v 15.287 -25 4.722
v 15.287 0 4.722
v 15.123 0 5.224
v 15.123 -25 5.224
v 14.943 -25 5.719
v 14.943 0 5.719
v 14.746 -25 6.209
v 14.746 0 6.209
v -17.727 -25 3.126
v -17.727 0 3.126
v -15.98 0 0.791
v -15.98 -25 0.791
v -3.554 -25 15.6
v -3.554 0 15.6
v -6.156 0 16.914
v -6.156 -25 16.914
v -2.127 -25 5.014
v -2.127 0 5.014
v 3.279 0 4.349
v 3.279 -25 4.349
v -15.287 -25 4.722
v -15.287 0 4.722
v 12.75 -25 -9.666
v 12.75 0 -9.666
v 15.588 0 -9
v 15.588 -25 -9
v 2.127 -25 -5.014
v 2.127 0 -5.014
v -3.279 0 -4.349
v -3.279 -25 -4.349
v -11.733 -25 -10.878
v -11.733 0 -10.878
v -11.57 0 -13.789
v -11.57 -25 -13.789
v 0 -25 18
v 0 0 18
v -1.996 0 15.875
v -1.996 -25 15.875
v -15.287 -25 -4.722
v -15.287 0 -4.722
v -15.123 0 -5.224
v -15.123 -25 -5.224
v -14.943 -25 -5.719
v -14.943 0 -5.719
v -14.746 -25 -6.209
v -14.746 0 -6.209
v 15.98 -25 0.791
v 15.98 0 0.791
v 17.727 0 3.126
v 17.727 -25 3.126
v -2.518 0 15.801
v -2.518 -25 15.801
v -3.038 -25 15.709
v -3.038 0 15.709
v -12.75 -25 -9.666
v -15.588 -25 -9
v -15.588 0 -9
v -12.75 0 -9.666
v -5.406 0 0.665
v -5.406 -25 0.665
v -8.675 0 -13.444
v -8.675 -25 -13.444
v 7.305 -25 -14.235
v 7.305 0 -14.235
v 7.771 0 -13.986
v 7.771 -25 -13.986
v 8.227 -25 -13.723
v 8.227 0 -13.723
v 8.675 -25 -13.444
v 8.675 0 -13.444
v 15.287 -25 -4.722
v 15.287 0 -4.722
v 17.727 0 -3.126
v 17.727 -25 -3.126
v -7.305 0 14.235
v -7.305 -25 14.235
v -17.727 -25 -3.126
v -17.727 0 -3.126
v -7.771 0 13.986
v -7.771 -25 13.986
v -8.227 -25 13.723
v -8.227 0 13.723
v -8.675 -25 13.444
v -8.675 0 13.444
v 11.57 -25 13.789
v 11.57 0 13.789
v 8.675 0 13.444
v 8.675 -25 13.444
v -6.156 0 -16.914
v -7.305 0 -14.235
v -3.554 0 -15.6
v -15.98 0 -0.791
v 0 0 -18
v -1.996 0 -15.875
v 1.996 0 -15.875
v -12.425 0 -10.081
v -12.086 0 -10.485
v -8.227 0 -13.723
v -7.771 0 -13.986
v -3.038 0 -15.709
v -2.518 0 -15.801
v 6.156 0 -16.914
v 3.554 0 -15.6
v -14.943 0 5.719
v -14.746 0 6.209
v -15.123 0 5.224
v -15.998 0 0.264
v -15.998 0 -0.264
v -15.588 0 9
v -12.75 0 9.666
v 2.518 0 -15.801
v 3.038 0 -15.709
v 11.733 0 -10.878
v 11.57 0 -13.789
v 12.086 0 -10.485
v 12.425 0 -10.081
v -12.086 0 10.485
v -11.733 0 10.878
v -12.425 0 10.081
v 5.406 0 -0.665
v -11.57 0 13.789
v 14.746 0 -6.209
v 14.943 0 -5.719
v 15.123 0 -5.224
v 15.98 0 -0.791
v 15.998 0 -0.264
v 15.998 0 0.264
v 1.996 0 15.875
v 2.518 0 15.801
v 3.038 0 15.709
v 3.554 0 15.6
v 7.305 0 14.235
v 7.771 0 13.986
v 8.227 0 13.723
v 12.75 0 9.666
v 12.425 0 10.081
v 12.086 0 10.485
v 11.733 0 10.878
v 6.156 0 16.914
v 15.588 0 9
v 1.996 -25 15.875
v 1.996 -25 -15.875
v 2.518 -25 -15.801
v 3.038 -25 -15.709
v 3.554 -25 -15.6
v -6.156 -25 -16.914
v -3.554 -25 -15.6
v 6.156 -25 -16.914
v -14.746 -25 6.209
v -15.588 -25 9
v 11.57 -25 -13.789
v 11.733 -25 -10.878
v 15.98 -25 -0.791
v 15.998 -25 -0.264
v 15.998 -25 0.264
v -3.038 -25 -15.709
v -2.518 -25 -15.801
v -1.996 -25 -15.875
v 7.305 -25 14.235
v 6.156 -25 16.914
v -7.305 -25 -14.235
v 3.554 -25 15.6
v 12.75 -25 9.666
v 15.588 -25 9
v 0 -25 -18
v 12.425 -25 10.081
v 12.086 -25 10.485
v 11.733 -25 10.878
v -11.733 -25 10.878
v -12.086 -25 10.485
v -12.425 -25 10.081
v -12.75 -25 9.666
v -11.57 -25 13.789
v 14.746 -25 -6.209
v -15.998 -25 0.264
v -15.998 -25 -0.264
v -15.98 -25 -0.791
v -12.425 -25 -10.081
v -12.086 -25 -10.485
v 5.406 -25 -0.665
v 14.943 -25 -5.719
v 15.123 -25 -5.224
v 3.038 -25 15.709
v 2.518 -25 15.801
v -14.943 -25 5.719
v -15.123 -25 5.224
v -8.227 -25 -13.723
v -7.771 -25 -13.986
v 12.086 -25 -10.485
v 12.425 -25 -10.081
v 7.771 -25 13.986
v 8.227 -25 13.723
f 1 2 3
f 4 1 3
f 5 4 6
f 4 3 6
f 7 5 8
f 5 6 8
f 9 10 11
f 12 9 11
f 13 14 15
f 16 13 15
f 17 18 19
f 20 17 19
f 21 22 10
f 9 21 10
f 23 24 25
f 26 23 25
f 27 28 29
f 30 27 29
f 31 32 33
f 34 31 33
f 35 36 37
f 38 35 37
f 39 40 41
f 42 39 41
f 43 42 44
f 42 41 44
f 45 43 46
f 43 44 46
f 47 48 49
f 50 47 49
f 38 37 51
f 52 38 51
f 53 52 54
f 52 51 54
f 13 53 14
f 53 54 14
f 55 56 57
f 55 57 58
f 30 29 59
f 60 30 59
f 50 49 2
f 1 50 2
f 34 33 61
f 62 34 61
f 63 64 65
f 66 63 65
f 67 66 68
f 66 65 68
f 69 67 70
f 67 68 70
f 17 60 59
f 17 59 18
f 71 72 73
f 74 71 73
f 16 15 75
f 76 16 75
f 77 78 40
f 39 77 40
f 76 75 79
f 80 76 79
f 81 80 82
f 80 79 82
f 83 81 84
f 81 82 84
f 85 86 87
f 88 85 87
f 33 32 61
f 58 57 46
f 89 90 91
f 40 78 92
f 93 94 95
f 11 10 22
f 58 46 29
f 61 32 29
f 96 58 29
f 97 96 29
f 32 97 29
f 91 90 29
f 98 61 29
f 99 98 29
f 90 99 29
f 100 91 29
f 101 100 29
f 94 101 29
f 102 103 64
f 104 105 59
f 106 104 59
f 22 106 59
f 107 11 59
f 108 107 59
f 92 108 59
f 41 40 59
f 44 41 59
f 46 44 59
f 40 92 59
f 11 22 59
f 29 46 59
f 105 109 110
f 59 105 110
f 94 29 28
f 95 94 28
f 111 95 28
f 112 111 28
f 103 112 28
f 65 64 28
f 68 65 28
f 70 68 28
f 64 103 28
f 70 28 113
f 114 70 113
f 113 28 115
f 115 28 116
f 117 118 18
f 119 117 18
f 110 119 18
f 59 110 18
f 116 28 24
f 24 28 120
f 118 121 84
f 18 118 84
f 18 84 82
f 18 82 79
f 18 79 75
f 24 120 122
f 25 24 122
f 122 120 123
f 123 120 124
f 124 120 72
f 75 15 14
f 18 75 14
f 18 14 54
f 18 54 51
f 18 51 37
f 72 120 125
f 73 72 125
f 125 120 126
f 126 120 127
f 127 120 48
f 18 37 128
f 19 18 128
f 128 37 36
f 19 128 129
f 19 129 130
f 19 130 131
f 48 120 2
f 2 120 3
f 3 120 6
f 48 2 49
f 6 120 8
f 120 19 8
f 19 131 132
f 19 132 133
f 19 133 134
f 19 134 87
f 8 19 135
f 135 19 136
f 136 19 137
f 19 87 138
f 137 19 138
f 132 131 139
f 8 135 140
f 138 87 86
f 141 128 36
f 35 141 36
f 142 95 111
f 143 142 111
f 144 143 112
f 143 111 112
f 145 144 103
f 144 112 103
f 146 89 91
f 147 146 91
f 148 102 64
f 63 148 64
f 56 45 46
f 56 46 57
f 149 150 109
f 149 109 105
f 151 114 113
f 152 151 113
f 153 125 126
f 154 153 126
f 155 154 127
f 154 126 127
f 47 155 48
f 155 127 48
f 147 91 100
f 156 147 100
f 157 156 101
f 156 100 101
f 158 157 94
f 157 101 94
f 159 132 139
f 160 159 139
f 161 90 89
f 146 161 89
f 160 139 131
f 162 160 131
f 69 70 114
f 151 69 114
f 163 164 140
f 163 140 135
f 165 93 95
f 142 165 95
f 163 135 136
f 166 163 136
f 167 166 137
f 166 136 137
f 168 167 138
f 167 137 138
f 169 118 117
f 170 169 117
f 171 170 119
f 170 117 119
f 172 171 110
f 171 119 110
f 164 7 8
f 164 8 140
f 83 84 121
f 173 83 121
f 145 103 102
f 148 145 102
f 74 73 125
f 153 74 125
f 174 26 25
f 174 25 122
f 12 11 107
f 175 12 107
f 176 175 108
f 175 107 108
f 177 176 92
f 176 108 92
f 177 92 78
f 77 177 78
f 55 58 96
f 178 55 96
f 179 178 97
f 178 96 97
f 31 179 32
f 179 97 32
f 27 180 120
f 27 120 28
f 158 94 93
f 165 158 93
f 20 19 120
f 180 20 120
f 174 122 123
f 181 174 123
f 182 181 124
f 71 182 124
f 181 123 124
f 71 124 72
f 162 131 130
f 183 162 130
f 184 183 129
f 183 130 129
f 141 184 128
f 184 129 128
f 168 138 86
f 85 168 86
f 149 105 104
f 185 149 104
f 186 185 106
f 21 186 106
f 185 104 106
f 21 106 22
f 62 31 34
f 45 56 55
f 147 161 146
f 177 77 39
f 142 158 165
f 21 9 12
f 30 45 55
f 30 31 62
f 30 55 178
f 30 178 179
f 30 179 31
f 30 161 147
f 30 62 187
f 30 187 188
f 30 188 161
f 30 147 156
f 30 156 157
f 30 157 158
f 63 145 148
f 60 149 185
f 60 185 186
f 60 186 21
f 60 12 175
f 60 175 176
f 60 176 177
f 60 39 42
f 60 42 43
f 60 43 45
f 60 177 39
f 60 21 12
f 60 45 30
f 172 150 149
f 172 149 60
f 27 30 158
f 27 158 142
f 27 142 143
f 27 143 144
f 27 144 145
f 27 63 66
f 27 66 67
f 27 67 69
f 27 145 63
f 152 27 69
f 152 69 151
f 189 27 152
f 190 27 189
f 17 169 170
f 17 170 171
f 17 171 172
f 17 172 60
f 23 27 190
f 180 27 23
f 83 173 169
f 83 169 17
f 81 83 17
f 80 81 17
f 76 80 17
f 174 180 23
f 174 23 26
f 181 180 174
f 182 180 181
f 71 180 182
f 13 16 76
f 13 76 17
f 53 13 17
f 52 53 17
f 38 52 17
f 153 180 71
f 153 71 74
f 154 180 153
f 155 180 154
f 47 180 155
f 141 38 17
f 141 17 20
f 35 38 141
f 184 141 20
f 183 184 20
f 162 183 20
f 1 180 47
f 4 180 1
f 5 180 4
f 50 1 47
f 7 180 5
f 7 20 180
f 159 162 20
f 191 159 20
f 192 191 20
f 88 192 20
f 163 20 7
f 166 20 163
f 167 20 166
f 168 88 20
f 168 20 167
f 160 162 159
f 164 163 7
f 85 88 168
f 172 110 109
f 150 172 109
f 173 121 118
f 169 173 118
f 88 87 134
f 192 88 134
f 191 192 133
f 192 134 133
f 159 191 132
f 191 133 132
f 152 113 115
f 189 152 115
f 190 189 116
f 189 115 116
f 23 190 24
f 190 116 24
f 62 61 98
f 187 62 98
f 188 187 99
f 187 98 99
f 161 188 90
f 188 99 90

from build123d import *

# Parameters (mm, degrees)
F1_DEPTH = 25


with BuildPart() as f1:
    # F0 (on Front) → F1 (new body)
    with BuildSketch(Plane.XZ):
        with BuildLine():
            ThreePointArc((1.99609, 15.875), (0, 16), (-1.99609, 15.875))
            ThreePointArc((-1.99609, 15.875), (-2.778371, 15.756924), (-3.553859, 15.600323))
            ThreePointArc((-3.553859, 15.600323), (-5.472322, 15.035082), (-7.305281, 14.234917))
            ThreePointArc((-7.305281, 14.234917), (-8, 13.856406), (-8.67516, 13.444017))
            ThreePointArc((-8.67516, 13.444017), (-10.284602, 12.256711), (-11.733347, 10.877894))
            ThreePointArc((-11.733347, 10.877894), (-12.256711, 10.284602), (-12.750108, 9.666165))
            ThreePointArc((-12.750108, 9.666165), (-13.856406, 8), (-14.746198, 6.208835))
            ThreePointArc((-14.746198, 6.208835), (-15.035082, 5.472322), (-15.287206, 4.72243))
            ThreePointArc((-15.287206, 4.72243), (-15.756924, 2.778371), (-15.98044, 0.7909))
            ThreePointArc((-15.98044, 0.7909), (-16, 0), (-15.98044, -0.7909))
            ThreePointArc((-15.98044, -0.7909), (-15.756924, -2.778371), (-15.287206, -4.72243))
            ThreePointArc((-15.287206, -4.72243), (-15.035082, -5.472322), (-14.746198, -6.208835))
            ThreePointArc((-14.746198, -6.208835), (-13.856406, -8), (-12.750108, -9.666165))
            ThreePointArc((-12.750108, -9.666165), (-12.256711, -10.284602), (-11.733347, -10.877894))
            ThreePointArc((-11.733347, -10.877894), (-10.284602, -12.256711), (-8.67516, -13.444017))
            ThreePointArc((-8.67516, -13.444017), (-8, -13.856406), (-7.305281, -14.234917))
            ThreePointArc((-7.305281, -14.234917), (-5.472322, -15.035082), (-3.553859, -15.600323))
            ThreePointArc((-3.553859, -15.600323), (-2.778371, -15.756924), (-1.99609, -15.875))
            ThreePointArc((-1.99609, -15.875), (-1, -15.968719), (0, -16))
            ThreePointArc((0, -16), (1, -15.968719), (1.99609, -15.875))
            ThreePointArc((1.99609, -15.875), (2.778371, -15.756924), (3.553859, -15.600323))
            ThreePointArc((3.553859, -15.600323), (5.472322, -15.035082), (7.305281, -14.234917))
            ThreePointArc((7.305281, -14.234917), (8, -13.856406), (8.67516, -13.444017))
            ThreePointArc((8.67516, -13.444017), (10.284602, -12.256711), (11.733347, -10.877894))
            ThreePointArc((11.733347, -10.877894), (12.256711, -10.284602), (12.750108, -9.666165))
            ThreePointArc((12.750108, -9.666165), (13.856406, -8), (14.746198, -6.208835))
            ThreePointArc((14.746198, -6.208835), (15.035082, -5.472322), (15.287206, -4.72243))
            ThreePointArc((15.287206, -4.72243), (15.756924, -2.778371), (15.98044, -0.7909))
            ThreePointArc((15.98044, -0.7909), (16, 0), (15.98044, 0.7909))
            ThreePointArc((15.98044, 0.7909), (15.756924, 2.778371), (15.287206, 4.72243))
            ThreePointArc((15.287206, 4.72243), (15.035082, 5.472322), (14.746198, 6.208835))
            ThreePointArc((14.746198, 6.208835), (13.856406, 8), (12.750108, 9.666165))
            ThreePointArc((12.750108, 9.666165), (12.256711, 10.284602), (11.733347, 10.877894))
            ThreePointArc((11.733347, 10.877894), (10.284602, 12.256711), (8.67516, 13.444017))
            ThreePointArc((8.67516, 13.444017), (8, 13.856406), (7.305281, 14.234917))
            ThreePointArc((7.305281, 14.234917), (5.472322, 15.035082), (3.553859, 15.600323))
            ThreePointArc((3.553859, 15.600323), (2.778371, 15.756924), (1.99609, 15.875))
        make_face()
        Polygon((-2.12708, 5.013831), (3.278565, 4.349021), (5.405645, -0.66481), (2.12708, -5.013831), (-3.278565, -4.349021), (-5.405645, 0.66481), align=None, mode=Mode.SUBTRACT)
        with BuildLine():
            Line((6.156363, 16.914467), (3.553859, 15.600323))
            ThreePointArc((3.553859, 15.600323), (5.472322, 15.035082), (7.305281, 14.234917))
            Line((7.305281, 14.234917), (6.156363, 16.914467))
        make_face()
        with BuildLine():
            Line((0, 18), (-1.99609, 15.875))
            ThreePointArc((-1.99609, 15.875), (0, 16), (1.99609, 15.875))
            Line((1.99609, 15.875), (0, 18))
        make_face()
        with BuildLine():
            ThreePointArc((-7.305281, 14.234917), (-5.472322, 15.035082), (-3.553859, 15.600323))
            Line((-3.553859, 15.600323), (-6.156363, 16.914467))
            Line((-6.156363, 16.914467), (-7.305281, 14.234917))
        make_face()
        with BuildLine():
            ThreePointArc((-11.733347, 10.877894), (-10.284602, 12.256711), (-8.67516, 13.444017))
            Line((-8.67516, 13.444017), (-11.570177, 13.7888))
            Line((-11.570177, 13.7888), (-11.733347, 10.877894))
        make_face()
        with BuildLine():
            ThreePointArc((-14.746198, 6.208835), (-13.856406, 8), (-12.750108, 9.666165))
            Line((-12.750108, 9.666165), (-15.588457, 9))
            Line((-15.588457, 9), (-14.746198, 6.208835))
        make_face()
        with BuildLine():
            ThreePointArc((-15.98044, 0.7909), (-15.756924, 2.778371), (-15.287206, 4.72243))
            Line((-15.287206, 4.72243), (-17.72654, 3.125667))
            Line((-17.72654, 3.125667), (-15.98044, 0.7909))
        make_face()
        with BuildLine():
            ThreePointArc((-15.287206, -4.72243), (-15.756924, -2.778371), (-15.98044, -0.7909))
            Line((-15.98044, -0.7909), (-17.72654, -3.125667))
            Line((-17.72654, -3.125667), (-15.287206, -4.72243))
        make_face()
        with BuildLine():
            ThreePointArc((-12.750108, -9.666165), (-13.856406, -8), (-14.746198, -6.208835))
            Line((-14.746198, -6.208835), (-15.588457, -9))
            Line((-15.588457, -9), (-12.750108, -9.666165))
        make_face()
        with BuildLine():
            ThreePointArc((-8.67516, -13.444017), (-10.284602, -12.256711), (-11.733347, -10.877894))
            Line((-11.733347, -10.877894), (-11.570177, -13.7888))
            Line((-11.570177, -13.7888), (-8.67516, -13.444017))
        make_face()
        with BuildLine():
            ThreePointArc((-3.553859, -15.600323), (-5.472322, -15.035082), (-7.305281, -14.234917))
            Line((-7.305281, -14.234917), (-6.156363, -16.914467))
            Line((-6.156363, -16.914467), (-3.553859, -15.600323))
        make_face()
        with BuildLine():
            ThreePointArc((0, -16), (-1, -15.968719), (-1.99609, -15.875))
            Line((-1.99609, -15.875), (0, -18))
            Line((0, -18), (1.99609, -15.875))
            ThreePointArc((1.99609, -15.875), (1, -15.968719), (0, -16))
        make_face()
        with BuildLine():
            Line((6.156363, -16.914467), (7.305281, -14.234917))
            ThreePointArc((7.305281, -14.234917), (5.472322, -15.035082), (3.553859, -15.600323))
            Line((3.553859, -15.600323), (6.156363, -16.914467))
        make_face()
        with BuildLine():
            Line((15.588457, -9), (14.746198, -6.208835))
            ThreePointArc((14.746198, -6.208835), (13.856406, -8), (12.750108, -9.666165))
            Line((12.750108, -9.666165), (15.588457, -9))
        make_face()
        with BuildLine():
            Line((17.72654, -3.125667), (15.98044, -0.7909))
            ThreePointArc((15.98044, -0.7909), (15.756924, -2.778371), (15.287206, -4.72243))
            Line((15.287206, -4.72243), (17.72654, -3.125667))
        make_face()
        with BuildLine():
            Line((17.72654, 3.125667), (15.287206, 4.72243))
            ThreePointArc((15.287206, 4.72243), (15.756924, 2.778371), (15.98044, 0.7909))
            Line((15.98044, 0.7909), (17.72654, 3.125667))
        make_face()
        with BuildLine():
            Line((15.588457, 9), (12.750108, 9.666165))
            ThreePointArc((12.750108, 9.666165), (13.856406, 8), (14.746198, 6.208835))
            Line((14.746198, 6.208835), (15.588457, 9))
        make_face()
        with BuildLine():
            Line((11.570177, 13.7888), (8.67516, 13.444017))
            ThreePointArc((8.67516, 13.444017), (10.284602, 12.256711), (11.733347, 10.877894))
            Line((11.733347, 10.877894), (11.570177, 13.7888))
        make_face()
        with BuildLine():
            Line((11.570177, -13.7888), (11.733347, -10.877894))
            ThreePointArc((11.733347, -10.877894), (10.284602, -12.256711), (8.67516, -13.444017))
            Line((8.67516, -13.444017), (11.570177, -13.7888))
        make_face()
    extrude(amount=F1_DEPTH)


solid = f1.part
